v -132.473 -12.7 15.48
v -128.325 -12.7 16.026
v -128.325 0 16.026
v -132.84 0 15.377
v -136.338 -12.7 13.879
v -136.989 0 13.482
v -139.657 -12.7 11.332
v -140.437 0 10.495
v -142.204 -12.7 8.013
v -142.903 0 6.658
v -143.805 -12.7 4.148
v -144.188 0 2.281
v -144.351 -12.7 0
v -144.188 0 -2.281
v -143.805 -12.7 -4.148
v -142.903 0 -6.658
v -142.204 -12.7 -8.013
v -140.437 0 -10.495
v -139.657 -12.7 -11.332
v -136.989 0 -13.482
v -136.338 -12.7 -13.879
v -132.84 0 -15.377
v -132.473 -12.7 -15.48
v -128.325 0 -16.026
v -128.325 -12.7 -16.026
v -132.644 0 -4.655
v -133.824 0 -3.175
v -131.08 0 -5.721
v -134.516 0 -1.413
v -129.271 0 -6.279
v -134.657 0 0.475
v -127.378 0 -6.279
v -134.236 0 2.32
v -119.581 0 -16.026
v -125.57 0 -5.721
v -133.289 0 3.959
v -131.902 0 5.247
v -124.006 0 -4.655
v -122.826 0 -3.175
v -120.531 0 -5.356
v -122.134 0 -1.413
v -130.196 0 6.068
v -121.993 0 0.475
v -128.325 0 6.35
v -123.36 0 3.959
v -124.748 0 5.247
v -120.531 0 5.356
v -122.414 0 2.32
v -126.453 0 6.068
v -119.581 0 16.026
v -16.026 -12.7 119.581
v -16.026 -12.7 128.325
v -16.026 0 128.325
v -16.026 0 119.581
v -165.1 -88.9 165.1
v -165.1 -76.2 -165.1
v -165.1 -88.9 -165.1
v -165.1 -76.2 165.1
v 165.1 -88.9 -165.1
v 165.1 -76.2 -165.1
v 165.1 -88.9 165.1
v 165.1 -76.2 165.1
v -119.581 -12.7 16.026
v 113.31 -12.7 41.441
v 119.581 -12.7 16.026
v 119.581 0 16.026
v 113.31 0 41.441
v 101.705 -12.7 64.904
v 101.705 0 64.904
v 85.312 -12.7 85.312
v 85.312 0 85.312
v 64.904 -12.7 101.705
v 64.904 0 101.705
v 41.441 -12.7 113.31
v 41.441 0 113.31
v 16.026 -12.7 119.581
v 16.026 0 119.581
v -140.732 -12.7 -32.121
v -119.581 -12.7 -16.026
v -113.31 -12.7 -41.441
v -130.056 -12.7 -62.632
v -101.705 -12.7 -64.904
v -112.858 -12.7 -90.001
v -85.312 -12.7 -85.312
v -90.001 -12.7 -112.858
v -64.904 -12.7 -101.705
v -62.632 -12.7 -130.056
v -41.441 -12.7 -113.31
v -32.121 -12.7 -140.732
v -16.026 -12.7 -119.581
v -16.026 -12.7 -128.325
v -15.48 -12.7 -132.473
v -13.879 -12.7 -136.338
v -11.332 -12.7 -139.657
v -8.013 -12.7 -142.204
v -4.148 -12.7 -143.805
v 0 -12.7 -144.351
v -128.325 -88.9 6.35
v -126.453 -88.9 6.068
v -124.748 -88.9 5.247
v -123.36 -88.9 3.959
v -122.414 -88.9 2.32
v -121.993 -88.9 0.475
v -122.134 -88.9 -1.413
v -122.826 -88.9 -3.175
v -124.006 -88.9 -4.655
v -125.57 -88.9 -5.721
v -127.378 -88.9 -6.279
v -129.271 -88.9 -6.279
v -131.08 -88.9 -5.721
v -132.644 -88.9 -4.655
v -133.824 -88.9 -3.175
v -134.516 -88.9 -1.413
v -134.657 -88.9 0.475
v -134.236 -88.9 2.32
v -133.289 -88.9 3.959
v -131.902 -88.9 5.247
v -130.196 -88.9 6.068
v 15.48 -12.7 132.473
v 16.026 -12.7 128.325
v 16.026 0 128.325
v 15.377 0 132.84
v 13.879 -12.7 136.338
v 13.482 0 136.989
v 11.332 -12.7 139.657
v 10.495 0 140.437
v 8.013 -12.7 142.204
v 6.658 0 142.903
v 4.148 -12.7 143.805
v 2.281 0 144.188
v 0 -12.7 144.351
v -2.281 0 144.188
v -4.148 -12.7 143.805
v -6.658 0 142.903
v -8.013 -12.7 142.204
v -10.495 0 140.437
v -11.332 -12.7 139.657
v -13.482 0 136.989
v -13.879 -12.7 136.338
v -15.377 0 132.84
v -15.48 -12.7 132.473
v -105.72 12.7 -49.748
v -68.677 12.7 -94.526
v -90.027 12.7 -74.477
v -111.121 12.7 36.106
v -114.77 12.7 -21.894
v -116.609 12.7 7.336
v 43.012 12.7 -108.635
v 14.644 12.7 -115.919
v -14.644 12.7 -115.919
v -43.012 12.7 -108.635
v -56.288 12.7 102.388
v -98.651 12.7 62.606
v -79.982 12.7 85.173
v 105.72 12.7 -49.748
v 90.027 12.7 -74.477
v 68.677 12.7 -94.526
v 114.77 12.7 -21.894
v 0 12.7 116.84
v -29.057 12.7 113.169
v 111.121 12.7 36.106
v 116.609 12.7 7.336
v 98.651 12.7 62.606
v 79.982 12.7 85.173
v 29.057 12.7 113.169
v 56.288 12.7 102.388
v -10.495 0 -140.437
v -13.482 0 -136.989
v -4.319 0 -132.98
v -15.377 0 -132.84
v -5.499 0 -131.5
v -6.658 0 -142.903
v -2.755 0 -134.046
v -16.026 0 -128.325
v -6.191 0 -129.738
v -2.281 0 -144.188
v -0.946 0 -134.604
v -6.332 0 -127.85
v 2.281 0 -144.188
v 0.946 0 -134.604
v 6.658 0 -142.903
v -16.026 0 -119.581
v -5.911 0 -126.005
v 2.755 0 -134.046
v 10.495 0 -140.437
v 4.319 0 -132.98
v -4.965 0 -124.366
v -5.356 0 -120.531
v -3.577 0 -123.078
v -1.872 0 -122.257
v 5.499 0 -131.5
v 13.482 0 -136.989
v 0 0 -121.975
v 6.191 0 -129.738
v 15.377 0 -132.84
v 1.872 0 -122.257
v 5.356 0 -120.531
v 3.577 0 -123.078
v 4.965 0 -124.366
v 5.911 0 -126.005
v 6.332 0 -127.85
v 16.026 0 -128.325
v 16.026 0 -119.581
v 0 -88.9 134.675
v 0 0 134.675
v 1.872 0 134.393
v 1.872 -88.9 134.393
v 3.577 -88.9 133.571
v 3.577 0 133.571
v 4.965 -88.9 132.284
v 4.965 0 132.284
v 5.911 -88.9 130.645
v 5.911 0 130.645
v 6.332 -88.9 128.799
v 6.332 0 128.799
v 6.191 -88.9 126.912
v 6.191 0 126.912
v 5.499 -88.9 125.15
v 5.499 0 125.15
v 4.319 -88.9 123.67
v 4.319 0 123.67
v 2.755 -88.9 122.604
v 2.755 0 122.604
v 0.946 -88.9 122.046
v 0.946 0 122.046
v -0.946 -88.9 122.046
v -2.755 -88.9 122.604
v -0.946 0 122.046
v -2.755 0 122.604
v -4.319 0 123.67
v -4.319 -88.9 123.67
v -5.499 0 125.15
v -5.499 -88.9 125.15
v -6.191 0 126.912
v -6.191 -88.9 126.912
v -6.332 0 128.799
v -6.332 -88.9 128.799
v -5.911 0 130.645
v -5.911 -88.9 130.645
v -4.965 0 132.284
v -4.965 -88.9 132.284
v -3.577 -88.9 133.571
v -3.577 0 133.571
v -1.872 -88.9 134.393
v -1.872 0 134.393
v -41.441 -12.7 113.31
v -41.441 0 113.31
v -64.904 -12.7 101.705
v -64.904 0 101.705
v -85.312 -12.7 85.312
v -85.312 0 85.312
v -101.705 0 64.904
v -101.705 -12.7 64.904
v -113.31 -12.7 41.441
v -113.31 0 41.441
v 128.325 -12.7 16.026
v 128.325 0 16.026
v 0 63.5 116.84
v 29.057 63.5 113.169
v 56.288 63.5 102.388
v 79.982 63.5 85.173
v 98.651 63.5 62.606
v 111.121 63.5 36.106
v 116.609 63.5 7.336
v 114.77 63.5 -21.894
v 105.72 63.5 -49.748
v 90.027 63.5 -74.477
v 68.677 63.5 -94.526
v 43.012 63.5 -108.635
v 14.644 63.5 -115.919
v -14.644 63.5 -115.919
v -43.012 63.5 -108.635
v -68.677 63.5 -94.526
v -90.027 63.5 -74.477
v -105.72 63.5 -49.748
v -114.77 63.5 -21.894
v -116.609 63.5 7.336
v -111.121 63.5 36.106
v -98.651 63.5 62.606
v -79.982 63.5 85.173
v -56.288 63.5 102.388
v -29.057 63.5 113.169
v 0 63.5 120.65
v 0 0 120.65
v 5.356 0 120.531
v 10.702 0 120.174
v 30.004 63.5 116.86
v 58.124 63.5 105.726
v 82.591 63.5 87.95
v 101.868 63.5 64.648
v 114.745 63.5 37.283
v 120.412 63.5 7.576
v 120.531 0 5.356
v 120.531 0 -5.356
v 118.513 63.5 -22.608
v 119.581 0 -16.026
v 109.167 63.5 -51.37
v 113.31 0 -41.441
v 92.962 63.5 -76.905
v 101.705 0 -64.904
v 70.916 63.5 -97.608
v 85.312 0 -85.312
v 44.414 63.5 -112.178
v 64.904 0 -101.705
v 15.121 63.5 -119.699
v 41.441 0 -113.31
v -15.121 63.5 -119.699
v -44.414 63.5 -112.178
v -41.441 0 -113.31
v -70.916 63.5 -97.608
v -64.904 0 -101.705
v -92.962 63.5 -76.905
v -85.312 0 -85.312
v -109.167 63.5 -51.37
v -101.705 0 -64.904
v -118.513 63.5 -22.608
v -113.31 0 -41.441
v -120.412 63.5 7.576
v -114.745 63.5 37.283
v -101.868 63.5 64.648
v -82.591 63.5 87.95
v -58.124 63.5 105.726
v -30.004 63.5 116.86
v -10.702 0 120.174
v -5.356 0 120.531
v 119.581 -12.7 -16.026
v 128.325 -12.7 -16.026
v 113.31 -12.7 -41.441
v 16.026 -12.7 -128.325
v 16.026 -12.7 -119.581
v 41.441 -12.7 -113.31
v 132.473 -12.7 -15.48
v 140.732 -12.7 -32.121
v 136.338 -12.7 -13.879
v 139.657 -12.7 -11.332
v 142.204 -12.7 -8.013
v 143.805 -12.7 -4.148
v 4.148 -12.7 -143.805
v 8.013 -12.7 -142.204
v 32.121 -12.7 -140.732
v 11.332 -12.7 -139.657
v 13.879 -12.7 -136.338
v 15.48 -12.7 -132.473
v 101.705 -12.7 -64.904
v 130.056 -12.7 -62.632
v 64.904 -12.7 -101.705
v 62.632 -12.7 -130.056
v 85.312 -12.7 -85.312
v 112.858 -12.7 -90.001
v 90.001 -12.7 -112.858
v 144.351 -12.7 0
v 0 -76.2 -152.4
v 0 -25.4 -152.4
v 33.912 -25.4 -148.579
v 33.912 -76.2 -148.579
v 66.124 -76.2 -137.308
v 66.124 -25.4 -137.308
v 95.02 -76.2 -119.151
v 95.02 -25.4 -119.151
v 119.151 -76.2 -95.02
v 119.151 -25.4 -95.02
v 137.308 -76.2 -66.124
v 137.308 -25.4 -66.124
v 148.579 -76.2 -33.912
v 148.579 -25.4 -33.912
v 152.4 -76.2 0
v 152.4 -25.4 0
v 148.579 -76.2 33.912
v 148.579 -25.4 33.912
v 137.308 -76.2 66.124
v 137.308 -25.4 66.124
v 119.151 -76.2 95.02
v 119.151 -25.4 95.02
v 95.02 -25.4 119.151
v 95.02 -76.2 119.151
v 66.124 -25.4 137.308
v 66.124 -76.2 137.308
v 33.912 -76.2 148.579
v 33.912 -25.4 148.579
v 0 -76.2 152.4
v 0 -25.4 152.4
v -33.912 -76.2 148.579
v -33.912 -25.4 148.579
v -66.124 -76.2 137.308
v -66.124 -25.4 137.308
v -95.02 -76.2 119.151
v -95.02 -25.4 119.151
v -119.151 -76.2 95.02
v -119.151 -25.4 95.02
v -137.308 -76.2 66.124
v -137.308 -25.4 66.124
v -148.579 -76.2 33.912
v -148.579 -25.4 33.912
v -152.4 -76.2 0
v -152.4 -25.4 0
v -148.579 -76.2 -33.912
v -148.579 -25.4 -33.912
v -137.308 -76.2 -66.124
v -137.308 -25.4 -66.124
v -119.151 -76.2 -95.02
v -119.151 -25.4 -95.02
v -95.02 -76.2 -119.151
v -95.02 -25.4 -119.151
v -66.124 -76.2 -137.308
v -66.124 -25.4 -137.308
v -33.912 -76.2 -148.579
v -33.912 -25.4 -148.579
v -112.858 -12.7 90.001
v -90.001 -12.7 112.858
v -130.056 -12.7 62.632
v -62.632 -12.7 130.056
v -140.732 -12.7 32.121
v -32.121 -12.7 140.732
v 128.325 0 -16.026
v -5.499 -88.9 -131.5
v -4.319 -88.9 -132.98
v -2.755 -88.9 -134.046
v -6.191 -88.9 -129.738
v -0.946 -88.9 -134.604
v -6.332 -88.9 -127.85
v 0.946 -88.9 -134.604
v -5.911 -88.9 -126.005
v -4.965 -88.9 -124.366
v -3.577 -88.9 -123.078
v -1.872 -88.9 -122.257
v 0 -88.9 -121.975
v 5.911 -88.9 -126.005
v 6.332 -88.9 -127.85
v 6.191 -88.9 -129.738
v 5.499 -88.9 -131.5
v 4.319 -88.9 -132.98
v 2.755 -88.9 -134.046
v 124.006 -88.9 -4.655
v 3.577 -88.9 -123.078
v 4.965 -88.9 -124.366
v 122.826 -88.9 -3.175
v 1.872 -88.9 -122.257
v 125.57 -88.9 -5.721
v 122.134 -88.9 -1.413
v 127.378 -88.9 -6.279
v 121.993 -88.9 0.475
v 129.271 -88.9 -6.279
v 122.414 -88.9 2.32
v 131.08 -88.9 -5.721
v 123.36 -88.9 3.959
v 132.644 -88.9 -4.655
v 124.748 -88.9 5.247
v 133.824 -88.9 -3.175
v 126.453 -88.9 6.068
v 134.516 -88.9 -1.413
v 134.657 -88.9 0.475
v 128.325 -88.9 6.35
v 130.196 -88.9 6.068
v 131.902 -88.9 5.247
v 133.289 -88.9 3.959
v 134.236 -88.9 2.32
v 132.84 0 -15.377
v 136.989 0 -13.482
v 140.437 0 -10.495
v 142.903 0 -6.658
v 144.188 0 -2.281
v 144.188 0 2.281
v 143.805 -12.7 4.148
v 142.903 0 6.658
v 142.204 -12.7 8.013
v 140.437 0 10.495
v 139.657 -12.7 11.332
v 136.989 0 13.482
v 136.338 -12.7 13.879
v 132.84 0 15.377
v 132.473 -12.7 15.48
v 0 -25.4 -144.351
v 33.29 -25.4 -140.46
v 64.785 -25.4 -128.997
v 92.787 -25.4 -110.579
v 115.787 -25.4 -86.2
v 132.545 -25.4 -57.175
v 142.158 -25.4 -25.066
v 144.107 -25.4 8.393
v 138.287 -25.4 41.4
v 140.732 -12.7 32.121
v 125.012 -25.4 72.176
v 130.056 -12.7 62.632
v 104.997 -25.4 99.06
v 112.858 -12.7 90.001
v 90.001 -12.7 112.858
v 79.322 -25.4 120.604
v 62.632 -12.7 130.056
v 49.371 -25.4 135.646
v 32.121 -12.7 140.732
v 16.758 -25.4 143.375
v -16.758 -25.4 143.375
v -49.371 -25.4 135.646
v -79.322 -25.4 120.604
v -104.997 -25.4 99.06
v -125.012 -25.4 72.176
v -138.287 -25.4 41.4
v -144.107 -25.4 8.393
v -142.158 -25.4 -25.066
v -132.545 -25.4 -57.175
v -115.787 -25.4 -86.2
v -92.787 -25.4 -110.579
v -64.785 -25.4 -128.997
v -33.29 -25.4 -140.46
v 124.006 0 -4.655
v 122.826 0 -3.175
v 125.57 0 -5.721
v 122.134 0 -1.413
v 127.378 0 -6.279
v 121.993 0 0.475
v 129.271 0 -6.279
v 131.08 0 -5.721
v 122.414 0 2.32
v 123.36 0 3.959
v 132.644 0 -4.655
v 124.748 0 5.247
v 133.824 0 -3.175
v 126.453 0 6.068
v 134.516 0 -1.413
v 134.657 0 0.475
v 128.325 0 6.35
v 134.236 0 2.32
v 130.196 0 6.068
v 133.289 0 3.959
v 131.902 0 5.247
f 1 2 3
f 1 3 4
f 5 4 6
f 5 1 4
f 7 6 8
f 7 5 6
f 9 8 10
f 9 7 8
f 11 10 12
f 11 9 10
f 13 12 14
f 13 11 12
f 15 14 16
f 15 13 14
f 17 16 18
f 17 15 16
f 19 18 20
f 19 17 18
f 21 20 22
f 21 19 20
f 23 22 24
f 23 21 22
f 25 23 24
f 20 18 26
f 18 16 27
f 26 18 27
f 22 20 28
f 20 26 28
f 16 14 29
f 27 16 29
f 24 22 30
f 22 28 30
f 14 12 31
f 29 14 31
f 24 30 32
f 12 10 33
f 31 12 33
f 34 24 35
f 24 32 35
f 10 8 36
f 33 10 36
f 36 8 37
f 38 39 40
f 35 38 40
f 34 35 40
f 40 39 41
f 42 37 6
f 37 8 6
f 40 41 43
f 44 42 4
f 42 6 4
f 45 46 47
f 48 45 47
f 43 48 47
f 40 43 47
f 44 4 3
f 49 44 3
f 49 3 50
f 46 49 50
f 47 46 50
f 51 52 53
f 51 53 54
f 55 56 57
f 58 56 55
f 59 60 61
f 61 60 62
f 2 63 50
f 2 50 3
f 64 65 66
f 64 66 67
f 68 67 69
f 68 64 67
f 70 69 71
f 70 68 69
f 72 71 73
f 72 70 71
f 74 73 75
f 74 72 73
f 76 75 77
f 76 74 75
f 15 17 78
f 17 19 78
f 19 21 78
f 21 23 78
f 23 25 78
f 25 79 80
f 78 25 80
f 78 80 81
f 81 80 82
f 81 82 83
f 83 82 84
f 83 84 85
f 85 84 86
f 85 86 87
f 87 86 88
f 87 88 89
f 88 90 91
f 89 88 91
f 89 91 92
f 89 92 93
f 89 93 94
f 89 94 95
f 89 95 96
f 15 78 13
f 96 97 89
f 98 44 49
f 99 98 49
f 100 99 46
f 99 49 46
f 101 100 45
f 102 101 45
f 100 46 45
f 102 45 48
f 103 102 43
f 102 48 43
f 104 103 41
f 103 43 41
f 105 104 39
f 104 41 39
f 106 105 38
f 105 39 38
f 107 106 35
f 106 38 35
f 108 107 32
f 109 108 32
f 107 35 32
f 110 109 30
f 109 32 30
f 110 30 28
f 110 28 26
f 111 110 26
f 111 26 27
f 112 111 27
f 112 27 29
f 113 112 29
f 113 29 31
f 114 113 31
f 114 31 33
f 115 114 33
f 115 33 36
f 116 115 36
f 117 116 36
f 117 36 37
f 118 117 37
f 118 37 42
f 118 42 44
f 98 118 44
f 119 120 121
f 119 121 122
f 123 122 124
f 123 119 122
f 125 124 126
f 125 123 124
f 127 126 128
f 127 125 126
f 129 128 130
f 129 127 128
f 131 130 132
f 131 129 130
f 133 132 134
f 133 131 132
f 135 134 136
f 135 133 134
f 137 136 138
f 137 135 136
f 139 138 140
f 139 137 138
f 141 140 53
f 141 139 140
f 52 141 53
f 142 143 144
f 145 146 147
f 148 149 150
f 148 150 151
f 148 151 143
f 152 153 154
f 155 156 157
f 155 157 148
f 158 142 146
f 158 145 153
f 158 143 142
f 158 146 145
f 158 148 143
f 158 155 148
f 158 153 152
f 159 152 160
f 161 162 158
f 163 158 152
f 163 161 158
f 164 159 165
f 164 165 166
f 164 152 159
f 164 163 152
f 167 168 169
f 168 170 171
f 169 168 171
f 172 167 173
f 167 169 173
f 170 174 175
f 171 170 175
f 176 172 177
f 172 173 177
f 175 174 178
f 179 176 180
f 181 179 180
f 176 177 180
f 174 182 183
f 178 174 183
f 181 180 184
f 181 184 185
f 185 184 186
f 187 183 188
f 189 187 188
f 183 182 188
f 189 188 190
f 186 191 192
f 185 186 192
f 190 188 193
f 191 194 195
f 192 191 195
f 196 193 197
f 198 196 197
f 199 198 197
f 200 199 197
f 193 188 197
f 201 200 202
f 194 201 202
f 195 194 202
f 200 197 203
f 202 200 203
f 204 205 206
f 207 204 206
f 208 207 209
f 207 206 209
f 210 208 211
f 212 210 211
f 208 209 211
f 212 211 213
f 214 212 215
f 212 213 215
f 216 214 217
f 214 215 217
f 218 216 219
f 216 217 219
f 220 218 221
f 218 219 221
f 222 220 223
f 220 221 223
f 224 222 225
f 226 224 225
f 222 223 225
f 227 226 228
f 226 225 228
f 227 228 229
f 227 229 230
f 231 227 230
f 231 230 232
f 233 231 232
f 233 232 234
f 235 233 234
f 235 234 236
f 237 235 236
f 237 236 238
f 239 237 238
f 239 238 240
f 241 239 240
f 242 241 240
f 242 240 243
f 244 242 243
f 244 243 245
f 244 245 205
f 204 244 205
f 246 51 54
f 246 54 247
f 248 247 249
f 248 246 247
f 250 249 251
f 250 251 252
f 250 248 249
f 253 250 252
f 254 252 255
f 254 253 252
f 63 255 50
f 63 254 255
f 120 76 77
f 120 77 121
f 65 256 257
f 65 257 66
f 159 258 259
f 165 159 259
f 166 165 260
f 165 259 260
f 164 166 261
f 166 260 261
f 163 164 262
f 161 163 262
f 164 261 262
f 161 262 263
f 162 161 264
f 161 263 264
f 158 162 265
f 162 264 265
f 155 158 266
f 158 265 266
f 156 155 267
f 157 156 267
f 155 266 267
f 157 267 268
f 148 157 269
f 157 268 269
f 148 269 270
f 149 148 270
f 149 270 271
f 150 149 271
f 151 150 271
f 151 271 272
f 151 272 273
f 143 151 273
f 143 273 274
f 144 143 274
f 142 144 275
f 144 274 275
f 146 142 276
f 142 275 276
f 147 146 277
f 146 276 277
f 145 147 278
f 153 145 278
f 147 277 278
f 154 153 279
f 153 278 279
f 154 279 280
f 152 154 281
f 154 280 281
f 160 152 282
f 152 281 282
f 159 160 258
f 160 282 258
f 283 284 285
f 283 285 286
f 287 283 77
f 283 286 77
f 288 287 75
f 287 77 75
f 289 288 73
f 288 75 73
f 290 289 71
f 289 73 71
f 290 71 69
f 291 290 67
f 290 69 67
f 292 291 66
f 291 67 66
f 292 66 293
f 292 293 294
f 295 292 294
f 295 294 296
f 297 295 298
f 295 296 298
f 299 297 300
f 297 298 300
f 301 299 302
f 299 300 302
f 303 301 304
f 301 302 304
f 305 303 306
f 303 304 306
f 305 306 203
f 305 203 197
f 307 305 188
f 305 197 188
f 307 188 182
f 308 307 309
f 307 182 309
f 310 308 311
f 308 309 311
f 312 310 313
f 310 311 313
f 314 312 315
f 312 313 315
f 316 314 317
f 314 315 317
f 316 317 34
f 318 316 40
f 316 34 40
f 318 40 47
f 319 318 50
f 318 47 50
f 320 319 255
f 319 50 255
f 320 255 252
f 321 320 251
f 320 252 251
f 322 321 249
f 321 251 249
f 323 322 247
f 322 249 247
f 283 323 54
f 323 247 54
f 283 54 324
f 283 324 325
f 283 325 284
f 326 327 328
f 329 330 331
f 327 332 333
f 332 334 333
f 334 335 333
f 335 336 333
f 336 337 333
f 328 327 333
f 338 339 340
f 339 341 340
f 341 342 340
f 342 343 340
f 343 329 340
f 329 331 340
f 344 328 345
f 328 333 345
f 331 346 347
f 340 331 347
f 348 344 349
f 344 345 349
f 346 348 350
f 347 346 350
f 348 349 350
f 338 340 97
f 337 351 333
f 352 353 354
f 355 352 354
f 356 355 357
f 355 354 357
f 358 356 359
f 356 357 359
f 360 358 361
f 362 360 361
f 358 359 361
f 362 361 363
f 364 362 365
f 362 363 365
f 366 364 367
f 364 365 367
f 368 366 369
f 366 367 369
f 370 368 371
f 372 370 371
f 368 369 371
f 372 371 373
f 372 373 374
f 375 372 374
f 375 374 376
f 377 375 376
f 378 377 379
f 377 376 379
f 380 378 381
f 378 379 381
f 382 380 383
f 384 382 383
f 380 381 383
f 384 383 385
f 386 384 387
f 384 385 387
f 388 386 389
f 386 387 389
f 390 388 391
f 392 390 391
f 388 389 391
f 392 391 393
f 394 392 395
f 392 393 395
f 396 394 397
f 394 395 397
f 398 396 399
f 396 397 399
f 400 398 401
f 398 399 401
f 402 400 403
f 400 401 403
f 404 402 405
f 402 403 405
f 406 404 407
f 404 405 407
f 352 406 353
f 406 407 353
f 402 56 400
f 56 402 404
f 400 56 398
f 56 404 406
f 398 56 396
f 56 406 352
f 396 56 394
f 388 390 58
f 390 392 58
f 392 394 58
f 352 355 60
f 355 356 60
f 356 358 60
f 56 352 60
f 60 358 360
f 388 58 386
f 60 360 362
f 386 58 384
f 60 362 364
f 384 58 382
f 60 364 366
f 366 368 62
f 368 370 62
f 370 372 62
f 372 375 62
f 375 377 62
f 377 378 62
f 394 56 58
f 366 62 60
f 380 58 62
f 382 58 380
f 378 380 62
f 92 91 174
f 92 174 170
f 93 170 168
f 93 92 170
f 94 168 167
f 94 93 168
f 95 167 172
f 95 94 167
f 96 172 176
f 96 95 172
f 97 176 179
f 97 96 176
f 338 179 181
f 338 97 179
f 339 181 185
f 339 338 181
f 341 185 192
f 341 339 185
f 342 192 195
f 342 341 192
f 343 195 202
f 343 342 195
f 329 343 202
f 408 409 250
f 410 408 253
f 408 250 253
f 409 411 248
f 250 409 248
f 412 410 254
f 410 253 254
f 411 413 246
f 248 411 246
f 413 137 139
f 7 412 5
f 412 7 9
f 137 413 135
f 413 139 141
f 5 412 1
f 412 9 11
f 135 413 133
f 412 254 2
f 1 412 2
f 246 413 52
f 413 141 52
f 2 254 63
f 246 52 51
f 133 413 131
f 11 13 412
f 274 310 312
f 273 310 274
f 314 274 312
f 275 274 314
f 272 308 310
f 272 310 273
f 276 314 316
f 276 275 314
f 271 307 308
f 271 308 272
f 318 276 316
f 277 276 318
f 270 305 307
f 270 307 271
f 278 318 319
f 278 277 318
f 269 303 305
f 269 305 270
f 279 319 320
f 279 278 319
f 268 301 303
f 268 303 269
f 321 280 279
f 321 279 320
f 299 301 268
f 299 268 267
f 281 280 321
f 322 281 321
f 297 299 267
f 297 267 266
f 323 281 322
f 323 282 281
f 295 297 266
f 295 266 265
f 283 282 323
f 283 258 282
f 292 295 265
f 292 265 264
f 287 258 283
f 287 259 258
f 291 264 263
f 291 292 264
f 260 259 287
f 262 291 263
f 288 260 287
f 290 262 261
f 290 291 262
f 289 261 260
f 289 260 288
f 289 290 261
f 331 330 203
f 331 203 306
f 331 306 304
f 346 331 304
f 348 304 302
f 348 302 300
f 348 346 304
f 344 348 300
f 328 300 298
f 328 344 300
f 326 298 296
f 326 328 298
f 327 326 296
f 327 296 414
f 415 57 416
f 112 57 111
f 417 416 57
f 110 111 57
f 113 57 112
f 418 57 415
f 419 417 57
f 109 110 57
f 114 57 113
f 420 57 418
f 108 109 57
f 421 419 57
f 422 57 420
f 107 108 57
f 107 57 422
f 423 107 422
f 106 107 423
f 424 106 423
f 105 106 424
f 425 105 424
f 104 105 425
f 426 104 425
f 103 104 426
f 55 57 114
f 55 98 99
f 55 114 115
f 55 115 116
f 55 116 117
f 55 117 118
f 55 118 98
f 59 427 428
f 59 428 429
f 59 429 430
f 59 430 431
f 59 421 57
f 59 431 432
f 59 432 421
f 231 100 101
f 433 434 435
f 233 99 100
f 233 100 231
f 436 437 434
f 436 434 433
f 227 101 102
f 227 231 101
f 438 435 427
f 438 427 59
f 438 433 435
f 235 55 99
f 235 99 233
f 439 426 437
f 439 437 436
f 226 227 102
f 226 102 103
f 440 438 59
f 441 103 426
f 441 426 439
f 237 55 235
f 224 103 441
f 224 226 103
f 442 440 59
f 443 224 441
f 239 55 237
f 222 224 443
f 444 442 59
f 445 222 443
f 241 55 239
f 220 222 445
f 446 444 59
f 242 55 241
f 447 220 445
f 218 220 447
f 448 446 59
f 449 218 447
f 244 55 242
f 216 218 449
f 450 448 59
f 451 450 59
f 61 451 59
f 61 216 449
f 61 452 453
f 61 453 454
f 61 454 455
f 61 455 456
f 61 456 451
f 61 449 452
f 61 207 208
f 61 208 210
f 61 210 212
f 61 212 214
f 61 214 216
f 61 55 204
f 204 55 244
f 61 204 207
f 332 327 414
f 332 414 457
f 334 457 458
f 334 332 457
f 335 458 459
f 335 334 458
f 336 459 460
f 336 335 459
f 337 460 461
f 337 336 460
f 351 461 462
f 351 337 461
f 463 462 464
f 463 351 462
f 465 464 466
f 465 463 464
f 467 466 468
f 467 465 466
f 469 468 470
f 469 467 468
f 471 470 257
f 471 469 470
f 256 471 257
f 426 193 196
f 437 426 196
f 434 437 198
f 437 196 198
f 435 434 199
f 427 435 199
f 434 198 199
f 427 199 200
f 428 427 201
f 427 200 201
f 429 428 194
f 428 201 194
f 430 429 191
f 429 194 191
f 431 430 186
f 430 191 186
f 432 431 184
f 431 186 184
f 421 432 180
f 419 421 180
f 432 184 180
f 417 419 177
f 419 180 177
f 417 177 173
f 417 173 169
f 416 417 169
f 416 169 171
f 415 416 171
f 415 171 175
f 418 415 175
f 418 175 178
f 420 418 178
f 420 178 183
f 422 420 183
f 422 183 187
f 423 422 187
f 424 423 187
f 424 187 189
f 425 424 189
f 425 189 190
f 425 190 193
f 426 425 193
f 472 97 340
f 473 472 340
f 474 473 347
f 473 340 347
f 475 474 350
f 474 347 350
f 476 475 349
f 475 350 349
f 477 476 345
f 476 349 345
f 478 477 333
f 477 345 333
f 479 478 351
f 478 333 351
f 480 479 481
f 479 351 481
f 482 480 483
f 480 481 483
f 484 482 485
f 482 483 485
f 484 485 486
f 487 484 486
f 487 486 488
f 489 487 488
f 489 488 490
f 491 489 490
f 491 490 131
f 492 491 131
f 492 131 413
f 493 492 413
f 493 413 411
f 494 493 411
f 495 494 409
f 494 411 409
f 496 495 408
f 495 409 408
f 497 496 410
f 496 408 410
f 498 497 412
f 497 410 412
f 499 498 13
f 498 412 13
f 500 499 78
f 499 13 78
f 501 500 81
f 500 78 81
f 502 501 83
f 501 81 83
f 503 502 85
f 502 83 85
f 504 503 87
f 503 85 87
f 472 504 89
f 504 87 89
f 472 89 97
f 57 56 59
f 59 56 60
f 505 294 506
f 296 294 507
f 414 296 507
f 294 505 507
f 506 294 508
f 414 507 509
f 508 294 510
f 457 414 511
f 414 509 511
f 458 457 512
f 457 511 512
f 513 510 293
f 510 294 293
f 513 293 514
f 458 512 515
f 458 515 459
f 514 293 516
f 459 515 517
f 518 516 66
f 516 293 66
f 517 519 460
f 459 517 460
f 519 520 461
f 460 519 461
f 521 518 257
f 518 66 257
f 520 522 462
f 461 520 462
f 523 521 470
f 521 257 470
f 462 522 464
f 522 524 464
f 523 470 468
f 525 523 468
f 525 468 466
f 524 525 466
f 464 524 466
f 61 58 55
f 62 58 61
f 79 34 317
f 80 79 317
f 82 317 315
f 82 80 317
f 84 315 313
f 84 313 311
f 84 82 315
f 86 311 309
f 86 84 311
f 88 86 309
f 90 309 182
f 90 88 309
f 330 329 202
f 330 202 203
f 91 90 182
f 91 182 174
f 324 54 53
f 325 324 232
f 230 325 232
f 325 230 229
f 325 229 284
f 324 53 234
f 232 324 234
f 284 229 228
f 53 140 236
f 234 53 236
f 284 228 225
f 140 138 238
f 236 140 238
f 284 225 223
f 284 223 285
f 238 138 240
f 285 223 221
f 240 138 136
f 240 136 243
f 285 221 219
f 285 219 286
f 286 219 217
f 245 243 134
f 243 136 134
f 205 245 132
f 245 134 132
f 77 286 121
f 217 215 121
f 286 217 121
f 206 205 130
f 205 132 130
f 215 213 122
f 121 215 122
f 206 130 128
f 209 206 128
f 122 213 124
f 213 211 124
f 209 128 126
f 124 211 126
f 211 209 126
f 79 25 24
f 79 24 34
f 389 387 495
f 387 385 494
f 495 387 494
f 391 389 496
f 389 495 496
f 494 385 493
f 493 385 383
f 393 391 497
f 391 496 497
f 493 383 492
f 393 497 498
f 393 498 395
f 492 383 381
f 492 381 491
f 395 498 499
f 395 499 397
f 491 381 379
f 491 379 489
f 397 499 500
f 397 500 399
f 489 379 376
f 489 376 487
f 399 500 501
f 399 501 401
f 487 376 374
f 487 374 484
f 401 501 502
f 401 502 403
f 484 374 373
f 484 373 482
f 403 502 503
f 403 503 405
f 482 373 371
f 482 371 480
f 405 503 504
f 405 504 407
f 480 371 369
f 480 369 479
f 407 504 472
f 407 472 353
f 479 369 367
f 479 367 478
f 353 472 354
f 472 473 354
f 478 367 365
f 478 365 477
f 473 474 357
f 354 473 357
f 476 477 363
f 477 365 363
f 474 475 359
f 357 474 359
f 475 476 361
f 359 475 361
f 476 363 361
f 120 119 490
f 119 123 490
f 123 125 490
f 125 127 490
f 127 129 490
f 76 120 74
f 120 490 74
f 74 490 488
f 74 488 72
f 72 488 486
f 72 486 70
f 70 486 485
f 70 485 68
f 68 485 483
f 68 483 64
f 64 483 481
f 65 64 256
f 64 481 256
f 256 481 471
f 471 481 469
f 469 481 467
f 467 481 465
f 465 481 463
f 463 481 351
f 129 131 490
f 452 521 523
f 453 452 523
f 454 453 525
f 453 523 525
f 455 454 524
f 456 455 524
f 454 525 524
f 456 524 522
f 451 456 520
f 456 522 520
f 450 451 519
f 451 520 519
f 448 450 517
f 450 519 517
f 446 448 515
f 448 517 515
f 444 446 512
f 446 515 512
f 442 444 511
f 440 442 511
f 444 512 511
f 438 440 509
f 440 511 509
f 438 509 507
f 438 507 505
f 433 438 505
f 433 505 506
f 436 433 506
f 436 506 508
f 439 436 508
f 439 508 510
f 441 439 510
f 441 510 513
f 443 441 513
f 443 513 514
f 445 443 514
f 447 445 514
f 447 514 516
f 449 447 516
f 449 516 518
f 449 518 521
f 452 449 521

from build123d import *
from build123d.topology import SkipClean

# Parameters (mm, degrees)
SKETCH1_R           = 120.65
BOSS_EXTRUDE1_DEPTH = 63.5
SKETCH2_R           = 116.84
CUT_EXTRUDE1_DEPTH  = 50.8
BOSS_EXTRUDE3_START = 12.7
BOSS_EXTRUDE3_DEPTH = 12.7
SKETCH5_R           = 144.351080184
BOSS_EXTRUDE4_DEPTH = 12.7
SKETCH6_R           = 152.4
BOSS_EXTRUDE5_DEPTH = 50.8
SKETCH8_W           = 330.2
SKETCH8_H           = 330.2
BOSS_EXTRUDE6_DEPTH = 12.7
SKETCH7_R           = 6.35
CUT_EXTRUDE2_DEPTH  = 250.838407776


with BuildPart() as part:
    # Sketch1 → Boss-Extrude1 (new body)
    with BuildSketch(Plane(origin=(0, 0, 0), x_dir=(1, 0, 0), z_dir=(0, 1, 0))):
        Circle(SKETCH1_R)
    extrude(amount=BOSS_EXTRUDE1_DEPTH)

    # Sketch2 → Cut-Extrude1 (cut)
    with BuildSketch(Plane(origin=(0, 63.5, 0), x_dir=(1, 0, 0), z_dir=(0, 1, 0))):
        Circle(SKETCH2_R)
    extrude(amount=-CUT_EXTRUDE1_DEPTH, mode=Mode.SUBTRACT)

    # Sketch4 → Boss-Extrude3 (add)
    with SkipClean():  # the faces are left unmerged after this step: merging them gives an invalid solid
        with BuildSketch(Plane.XZ.offset(BOSS_EXTRUDE3_START)):
            with BuildLine():
                Line((-16.026299781, 128.324780403), (-16.026299781, 119.58085221))
                ThreePointArc((-16.026299781, 119.58085221), (-85.31243315, 85.31243315), (-119.58085221, 16.026299781))
                Line((-119.58085221, 16.026299781), (-128.324780403, 16.026299781))
                ThreePointArc((-128.324780403, 16.026299781), (-144.351080184, 0), (-128.324780403, -16.026299781))
                Line((-128.324780403, -16.026299781), (-119.58085221, -16.026299781))
                ThreePointArc((-119.58085221, -16.026299781), (-85.31243315, -85.31243315), (-16.026299781, -119.58085221))
                Line((-16.026299781, -119.58085221), (-16.026299781, -128.324780403))
                ThreePointArc((-16.026299781, -128.324780403), (0, -144.351080184), (16.026299781, -128.324780403))
                Line((16.026299781, -128.324780403), (16.026299781, -119.58085221))
                ThreePointArc((16.026299781, -119.58085221), (85.31243315, -85.31243315), (119.58085221, -16.026299781))
                Line((119.58085221, -16.026299781), (128.324780403, -16.026299781))
                ThreePointArc((128.324780403, -16.026299781), (144.351080184, 0), (128.324780403, 16.026299781))
                Line((128.324780403, 16.026299781), (119.58085221, 16.026299781))
                ThreePointArc((119.58085221, 16.026299781), (85.31243315, 85.31243315), (16.026299781, 119.58085221))
                Line((16.026299781, 119.58085221), (16.026299781, 128.324780403))
                ThreePointArc((16.026299781, 128.324780403), (0, 144.351080184), (-16.026299781, 128.324780403))
            make_face()
        extrude(amount=-BOSS_EXTRUDE3_DEPTH)

    # Sketch5 → Boss-Extrude4 (add)
    with SkipClean():  # the faces are left unmerged after this step: merging them gives an invalid solid
        with BuildSketch(Plane.XZ.offset(12.7)):
            Circle(SKETCH5_R)
        extrude(amount=BOSS_EXTRUDE4_DEPTH)

    # Sketch6 → Boss-Extrude5 (add)
    with BuildSketch(Plane.XZ.offset(25.4)):
        Circle(SKETCH6_R)
    extrude(amount=BOSS_EXTRUDE5_DEPTH)

    # Sketch8 → Boss-Extrude6 (add)
    with BuildSketch(Plane.XZ.offset(76.2)):
        Rectangle(SKETCH8_W, SKETCH8_H)
    extrude(amount=BOSS_EXTRUDE6_DEPTH)

    # Sketch7 → Cut-Extrude2 (cut, through all)
    with SkipClean():  # the faces are left unmerged after this step: merging them gives an invalid solid
        with BuildSketch(Plane(origin=(0, 0, 0), x_dir=(1, 0, 0), z_dir=(0, 1, 0))):
            with Locations((0, 128.324780403)):
                Circle(SKETCH7_R)
            with Locations((-128.324780403, 0)):
                Circle(SKETCH7_R)
            with Locations((0, -128.324780403)):
                Circle(SKETCH7_R)
            with Locations((128.324780403, 0)):
                Circle(SKETCH7_R)
        extrude(amount=-CUT_EXTRUDE2_DEPTH, mode=Mode.SUBTRACT)


solid = part.part
